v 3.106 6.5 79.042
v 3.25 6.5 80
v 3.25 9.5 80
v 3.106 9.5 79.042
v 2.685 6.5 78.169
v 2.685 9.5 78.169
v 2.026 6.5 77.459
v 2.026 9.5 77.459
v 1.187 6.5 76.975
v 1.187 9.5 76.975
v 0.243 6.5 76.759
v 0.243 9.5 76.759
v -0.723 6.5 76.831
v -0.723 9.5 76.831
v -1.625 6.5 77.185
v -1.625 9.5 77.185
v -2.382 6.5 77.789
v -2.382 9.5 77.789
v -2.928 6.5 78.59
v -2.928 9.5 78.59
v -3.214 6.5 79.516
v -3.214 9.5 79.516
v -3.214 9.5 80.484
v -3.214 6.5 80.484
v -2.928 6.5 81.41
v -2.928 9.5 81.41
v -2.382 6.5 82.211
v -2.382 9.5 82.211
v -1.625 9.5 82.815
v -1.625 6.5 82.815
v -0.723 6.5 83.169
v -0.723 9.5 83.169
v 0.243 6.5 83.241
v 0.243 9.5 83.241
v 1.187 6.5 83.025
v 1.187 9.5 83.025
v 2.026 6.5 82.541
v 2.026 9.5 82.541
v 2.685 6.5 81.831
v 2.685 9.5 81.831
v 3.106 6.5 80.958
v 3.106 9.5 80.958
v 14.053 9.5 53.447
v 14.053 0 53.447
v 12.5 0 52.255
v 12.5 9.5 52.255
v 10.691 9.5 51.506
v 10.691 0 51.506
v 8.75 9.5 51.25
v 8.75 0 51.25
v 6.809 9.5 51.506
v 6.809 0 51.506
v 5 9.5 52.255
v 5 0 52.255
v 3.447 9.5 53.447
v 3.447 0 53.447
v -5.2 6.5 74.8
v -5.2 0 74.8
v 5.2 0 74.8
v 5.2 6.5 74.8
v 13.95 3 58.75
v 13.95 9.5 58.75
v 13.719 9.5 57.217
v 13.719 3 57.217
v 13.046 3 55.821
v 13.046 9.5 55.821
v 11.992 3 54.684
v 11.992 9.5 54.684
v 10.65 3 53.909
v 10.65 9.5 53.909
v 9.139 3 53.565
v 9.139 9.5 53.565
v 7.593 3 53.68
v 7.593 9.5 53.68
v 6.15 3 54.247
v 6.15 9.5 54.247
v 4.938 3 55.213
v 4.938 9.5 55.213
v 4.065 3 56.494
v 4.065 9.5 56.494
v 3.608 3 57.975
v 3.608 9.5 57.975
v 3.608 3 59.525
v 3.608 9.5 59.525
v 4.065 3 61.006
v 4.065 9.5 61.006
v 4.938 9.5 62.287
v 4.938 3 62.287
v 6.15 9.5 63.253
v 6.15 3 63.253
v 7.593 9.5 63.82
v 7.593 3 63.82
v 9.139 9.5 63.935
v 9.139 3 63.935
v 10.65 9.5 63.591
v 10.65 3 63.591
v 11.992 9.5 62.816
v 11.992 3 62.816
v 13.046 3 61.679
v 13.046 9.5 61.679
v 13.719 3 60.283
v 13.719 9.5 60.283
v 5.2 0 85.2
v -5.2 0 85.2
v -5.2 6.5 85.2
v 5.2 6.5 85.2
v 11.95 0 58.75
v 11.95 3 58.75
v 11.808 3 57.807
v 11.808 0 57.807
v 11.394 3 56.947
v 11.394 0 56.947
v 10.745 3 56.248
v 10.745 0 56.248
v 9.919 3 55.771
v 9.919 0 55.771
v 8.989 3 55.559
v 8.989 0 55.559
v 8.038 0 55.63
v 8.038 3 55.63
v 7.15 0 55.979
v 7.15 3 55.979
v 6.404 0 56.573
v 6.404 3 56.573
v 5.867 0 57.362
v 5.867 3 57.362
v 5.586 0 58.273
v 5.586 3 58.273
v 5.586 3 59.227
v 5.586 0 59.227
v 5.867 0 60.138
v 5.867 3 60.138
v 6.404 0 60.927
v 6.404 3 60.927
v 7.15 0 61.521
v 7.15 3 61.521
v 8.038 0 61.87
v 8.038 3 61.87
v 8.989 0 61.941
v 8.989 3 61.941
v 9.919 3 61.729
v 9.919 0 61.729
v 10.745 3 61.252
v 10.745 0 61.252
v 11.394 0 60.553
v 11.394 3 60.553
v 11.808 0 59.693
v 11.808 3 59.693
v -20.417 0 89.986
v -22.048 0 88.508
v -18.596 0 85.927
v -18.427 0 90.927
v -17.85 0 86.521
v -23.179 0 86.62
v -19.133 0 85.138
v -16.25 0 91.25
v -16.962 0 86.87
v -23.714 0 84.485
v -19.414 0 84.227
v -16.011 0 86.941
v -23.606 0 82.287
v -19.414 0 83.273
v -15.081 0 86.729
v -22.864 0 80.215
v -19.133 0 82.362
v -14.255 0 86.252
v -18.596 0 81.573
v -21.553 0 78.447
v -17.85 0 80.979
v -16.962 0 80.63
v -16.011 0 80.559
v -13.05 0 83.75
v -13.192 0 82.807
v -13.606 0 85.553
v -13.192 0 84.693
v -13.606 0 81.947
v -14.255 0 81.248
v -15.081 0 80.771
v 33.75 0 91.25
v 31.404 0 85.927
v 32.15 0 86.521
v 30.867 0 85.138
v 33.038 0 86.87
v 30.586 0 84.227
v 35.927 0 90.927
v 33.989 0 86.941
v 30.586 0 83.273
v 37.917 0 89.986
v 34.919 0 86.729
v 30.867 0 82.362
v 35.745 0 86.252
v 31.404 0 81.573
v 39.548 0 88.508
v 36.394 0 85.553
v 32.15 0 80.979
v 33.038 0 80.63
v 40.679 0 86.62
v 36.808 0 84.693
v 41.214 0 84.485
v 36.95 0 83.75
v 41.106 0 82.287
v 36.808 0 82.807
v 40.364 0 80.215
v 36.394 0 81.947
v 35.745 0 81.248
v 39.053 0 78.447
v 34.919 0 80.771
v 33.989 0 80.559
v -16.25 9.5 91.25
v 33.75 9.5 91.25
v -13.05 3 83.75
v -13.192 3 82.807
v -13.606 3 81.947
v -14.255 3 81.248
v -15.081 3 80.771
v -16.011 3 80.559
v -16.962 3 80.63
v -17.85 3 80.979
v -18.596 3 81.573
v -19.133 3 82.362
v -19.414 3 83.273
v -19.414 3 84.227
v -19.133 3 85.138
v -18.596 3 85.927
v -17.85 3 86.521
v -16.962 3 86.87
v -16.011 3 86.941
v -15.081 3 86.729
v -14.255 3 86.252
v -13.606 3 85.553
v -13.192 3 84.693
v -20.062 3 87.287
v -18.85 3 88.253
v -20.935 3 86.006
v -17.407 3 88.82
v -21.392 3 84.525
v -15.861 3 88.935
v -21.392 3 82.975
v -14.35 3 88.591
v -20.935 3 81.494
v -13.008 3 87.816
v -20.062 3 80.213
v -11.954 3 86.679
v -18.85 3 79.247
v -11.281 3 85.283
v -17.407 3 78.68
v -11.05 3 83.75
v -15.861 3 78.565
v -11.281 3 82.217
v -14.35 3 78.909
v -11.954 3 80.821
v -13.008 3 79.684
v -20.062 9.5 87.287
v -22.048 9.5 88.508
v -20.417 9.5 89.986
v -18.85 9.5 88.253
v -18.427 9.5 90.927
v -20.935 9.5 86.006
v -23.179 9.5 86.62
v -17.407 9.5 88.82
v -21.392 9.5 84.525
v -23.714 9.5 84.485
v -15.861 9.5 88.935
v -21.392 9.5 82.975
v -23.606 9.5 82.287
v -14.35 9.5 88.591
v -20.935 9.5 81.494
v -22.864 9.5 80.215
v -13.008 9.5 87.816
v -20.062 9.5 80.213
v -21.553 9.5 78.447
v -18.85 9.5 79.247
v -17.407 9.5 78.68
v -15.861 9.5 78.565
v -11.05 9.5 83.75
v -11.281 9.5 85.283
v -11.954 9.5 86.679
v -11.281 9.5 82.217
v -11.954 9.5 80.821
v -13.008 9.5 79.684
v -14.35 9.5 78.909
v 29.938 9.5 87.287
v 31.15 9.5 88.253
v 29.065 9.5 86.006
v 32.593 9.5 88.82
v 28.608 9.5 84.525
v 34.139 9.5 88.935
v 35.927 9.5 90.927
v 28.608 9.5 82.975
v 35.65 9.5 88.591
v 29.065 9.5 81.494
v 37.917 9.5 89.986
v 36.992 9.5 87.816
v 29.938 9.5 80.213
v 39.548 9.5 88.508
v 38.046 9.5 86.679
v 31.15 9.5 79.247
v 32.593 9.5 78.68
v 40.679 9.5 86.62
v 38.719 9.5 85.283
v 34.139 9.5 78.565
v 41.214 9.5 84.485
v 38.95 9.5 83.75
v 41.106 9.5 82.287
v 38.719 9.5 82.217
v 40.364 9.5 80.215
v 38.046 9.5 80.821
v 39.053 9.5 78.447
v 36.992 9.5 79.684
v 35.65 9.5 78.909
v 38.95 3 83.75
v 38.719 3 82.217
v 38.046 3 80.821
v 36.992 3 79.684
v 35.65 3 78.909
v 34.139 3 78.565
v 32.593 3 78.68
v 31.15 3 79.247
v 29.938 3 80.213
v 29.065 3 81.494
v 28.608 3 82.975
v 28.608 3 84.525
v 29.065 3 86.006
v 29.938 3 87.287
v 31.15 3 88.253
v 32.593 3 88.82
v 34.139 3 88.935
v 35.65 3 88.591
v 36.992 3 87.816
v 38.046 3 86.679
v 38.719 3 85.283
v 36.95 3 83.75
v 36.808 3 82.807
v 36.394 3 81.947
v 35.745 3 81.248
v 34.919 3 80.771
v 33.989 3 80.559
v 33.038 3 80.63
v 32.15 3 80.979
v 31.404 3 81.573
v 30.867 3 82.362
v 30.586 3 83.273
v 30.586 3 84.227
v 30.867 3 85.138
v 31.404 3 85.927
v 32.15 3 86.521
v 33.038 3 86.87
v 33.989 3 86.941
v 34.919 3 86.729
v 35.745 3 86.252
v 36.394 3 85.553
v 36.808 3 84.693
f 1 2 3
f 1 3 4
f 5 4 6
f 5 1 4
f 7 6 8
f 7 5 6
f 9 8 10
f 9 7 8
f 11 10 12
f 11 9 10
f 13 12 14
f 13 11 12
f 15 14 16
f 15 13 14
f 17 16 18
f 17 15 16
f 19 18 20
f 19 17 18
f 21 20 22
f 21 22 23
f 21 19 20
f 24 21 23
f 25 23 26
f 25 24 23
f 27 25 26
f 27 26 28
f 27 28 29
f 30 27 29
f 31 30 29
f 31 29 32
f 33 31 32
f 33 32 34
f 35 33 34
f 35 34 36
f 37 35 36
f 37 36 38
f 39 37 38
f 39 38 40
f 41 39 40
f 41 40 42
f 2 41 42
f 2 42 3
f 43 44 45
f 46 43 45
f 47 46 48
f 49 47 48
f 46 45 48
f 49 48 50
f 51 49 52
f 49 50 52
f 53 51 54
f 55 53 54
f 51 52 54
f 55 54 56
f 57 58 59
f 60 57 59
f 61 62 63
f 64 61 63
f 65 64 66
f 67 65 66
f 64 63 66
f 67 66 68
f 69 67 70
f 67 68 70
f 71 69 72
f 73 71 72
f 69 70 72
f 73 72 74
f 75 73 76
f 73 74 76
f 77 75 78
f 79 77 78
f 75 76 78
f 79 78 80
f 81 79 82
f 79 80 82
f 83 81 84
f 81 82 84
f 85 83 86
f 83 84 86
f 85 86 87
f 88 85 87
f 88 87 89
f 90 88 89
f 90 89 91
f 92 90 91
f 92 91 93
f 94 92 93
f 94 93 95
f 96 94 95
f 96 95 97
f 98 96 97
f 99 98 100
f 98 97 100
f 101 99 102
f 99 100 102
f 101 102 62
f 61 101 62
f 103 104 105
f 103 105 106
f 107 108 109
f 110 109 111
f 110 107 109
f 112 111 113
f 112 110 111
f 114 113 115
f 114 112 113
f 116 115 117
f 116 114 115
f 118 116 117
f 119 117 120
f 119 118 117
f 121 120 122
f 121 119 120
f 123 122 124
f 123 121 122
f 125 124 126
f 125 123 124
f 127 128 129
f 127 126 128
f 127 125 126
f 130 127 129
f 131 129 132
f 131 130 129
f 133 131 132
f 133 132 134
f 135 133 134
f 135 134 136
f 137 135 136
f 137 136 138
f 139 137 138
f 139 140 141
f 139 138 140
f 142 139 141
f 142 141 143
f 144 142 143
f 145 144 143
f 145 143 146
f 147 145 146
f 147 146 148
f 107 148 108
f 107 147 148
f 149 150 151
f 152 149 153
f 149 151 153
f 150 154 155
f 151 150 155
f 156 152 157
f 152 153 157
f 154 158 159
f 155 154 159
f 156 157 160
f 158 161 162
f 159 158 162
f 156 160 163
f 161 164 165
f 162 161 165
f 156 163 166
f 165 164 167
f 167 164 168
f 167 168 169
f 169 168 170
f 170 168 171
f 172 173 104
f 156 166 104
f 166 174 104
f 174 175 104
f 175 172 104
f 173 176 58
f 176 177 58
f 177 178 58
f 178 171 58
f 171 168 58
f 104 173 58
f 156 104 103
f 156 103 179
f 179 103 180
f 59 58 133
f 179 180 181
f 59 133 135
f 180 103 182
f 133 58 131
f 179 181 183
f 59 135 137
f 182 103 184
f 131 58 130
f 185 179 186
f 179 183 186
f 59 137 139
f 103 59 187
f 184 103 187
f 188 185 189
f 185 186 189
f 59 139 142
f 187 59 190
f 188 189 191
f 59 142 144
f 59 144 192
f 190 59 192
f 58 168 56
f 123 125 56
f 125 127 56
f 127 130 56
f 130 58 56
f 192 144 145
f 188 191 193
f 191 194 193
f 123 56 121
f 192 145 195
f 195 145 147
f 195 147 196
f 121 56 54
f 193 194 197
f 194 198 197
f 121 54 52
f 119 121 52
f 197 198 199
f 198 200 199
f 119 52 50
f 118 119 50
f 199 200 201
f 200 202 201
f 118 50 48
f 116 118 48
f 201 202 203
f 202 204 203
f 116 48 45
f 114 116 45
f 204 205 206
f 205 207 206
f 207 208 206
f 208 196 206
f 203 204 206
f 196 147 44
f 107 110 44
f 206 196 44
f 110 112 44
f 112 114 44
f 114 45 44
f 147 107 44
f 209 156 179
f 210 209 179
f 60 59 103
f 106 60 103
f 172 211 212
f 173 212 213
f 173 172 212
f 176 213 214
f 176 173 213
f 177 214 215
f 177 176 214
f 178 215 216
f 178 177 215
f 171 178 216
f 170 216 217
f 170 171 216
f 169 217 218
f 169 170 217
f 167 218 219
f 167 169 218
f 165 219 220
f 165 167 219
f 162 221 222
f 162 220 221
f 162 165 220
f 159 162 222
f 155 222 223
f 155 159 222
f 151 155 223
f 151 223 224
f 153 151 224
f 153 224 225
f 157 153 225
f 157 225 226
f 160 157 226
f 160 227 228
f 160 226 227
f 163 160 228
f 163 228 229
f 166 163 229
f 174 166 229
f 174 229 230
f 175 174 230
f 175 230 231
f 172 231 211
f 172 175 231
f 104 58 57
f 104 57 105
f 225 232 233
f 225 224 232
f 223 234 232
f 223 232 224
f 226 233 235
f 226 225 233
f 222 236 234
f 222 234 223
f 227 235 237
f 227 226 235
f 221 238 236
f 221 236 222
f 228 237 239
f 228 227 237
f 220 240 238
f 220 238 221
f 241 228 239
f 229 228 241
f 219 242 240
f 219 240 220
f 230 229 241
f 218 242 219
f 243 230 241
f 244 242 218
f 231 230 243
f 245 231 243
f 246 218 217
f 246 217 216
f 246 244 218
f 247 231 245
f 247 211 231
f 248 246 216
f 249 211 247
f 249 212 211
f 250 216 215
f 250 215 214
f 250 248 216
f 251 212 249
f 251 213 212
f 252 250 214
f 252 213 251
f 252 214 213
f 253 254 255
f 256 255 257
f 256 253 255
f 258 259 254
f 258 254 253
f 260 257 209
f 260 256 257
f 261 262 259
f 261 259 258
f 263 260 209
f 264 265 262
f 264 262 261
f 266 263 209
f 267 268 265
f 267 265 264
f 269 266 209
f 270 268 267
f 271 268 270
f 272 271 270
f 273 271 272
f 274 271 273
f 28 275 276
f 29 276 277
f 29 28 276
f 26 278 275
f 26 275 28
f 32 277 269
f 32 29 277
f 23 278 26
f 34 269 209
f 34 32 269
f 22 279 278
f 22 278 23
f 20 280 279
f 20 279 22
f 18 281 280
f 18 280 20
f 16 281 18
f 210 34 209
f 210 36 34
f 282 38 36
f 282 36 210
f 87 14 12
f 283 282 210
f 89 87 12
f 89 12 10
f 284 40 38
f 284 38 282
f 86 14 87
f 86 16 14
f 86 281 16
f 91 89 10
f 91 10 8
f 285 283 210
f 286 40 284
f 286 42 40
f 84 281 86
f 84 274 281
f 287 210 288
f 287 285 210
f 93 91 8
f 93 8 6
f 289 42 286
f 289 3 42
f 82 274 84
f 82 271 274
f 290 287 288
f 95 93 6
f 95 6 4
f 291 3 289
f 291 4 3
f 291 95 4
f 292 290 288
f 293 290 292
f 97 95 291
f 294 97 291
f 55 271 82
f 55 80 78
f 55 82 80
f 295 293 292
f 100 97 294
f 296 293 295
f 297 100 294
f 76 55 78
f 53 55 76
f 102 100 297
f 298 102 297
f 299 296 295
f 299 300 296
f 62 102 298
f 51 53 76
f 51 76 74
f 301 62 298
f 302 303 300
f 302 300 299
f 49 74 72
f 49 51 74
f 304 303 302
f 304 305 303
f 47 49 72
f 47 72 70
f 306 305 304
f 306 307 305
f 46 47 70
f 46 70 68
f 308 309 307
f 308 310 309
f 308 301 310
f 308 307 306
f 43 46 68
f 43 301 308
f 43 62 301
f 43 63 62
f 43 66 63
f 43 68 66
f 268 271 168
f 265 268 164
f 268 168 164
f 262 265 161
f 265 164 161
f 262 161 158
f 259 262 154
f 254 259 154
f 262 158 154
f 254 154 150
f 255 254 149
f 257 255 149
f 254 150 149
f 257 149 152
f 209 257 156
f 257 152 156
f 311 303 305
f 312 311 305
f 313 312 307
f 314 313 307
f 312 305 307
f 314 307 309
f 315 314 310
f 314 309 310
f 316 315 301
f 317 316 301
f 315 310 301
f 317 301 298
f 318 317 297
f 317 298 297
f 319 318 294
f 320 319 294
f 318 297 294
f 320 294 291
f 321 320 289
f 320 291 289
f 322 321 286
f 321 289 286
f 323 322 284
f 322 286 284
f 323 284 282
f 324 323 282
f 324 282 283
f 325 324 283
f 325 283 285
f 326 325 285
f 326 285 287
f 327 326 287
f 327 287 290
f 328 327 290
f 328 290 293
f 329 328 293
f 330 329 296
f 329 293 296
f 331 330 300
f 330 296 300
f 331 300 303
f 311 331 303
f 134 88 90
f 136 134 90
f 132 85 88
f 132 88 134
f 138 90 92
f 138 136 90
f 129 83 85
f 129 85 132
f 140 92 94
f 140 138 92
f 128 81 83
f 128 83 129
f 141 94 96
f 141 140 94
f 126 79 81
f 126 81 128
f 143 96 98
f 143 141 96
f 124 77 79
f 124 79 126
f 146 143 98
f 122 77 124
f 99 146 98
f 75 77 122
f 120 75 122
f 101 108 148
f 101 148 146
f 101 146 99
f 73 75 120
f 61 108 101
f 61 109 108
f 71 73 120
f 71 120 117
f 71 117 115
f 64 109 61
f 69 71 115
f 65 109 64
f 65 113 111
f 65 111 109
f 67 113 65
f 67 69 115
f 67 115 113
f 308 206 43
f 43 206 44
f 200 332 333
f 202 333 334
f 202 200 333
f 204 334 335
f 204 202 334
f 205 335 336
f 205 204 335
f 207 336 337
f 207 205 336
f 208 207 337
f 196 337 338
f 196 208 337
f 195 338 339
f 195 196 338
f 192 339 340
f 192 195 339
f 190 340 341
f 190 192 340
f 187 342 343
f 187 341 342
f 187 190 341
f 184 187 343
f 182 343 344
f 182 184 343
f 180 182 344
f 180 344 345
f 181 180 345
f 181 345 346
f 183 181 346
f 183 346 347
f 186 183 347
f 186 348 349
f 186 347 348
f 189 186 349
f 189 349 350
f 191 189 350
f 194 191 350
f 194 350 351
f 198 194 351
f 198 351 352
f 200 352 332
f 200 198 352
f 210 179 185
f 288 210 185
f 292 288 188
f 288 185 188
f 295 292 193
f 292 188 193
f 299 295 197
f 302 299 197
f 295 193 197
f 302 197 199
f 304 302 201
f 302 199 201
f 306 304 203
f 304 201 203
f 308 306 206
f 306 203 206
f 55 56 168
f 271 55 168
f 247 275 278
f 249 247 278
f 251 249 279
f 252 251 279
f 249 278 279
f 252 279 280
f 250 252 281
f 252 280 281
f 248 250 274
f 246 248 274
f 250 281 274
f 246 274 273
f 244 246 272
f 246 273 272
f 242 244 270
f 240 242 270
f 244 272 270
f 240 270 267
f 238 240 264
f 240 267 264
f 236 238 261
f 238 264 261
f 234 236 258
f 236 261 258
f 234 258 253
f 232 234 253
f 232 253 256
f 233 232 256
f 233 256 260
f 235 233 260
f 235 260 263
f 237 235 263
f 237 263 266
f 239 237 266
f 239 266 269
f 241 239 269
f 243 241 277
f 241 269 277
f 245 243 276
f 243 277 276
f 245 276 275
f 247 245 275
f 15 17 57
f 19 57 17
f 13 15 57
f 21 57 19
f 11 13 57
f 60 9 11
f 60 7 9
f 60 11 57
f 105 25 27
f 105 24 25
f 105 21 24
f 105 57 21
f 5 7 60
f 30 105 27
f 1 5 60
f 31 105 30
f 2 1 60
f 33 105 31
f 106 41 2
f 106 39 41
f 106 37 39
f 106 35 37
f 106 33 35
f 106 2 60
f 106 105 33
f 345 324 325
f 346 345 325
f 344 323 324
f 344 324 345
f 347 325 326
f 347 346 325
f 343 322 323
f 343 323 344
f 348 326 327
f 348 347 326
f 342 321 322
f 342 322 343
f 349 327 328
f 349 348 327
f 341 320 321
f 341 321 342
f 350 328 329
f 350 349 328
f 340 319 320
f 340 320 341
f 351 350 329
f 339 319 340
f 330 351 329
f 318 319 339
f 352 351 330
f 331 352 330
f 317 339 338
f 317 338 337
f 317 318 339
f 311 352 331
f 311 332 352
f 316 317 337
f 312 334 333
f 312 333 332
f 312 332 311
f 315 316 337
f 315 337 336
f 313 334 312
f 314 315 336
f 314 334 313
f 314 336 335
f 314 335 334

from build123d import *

# Parameters (mm, degrees)
SKETCH_1_R          = 3.25
SKETCH_1_R_2        = 3.2
EXTRUDE_1_DEPTH     = 9.5
SKETCH_2_R          = 5.2
CUT_EXTRUDE_1_DEPTH = 6.5
SKETCH_3_W          = 10.4
SKETCH_3_H          = 10.4
SKETCH_3_R          = 3.25
CUT_EXTRUDE_2_DEPTH = 6.5


with BuildPart() as part:
    # 스케치1 → 보스-돌출1 (new body)
    with BuildSketch(Plane(origin=(0, 0, 0), x_dir=(1, 0, 0), z_dir=(0, 1, 0))):
        with BuildLine():
            Line((3.446699141, -53.446699141), (-21.553300859, -78.446699141))
            ThreePointArc((-21.553300859, -78.446699141), (-23.179096494, -86.620125743), (-16.25, -91.25))
            Line((-16.25, -91.25), (33.75, -91.25))
            ThreePointArc((33.75, -91.25), (40.679096494, -86.620125743), (39.053300859, -78.446699141))
            Line((39.053300859, -78.446699141), (14.053300859, -53.446699141))
            ThreePointArc((14.053300859, -53.446699141), (8.75, -51.25), (3.446699141, -53.446699141))
        make_face()
        with Locations((0, -80)):
            Circle(SKETCH_1_R, mode=Mode.SUBTRACT)
        with Locations((-16.25, -83.75)):
            Circle(SKETCH_1_R_2, mode=Mode.SUBTRACT)
        with Locations((8.75, -58.75)):
            Circle(SKETCH_1_R_2, mode=Mode.SUBTRACT)
        with Locations((33.75, -83.75)):
            Circle(SKETCH_1_R_2, mode=Mode.SUBTRACT)
    extrude(amount=EXTRUDE_1_DEPTH)

    # 스케치2 → 컷-돌출1 (cut)
    with BuildSketch(Plane(origin=(0, 9.5, 0), x_dir=(1, 0, 0), z_dir=(0, 1, 0))):
        with Locations((8.75, -58.75)):
            Circle(SKETCH_2_R)
        with Locations((33.75, -83.75)):
            Circle(SKETCH_2_R)
        with Locations((-16.25, -83.75)):
            Circle(SKETCH_2_R)
    extrude(amount=-CUT_EXTRUDE_1_DEPTH, mode=Mode.SUBTRACT)

    # 스케치3 → 컷-돌출2 (cut)
    with BuildSketch(Plane.XZ):
        with Locations((0, 80)):
            Rectangle(SKETCH_3_W, SKETCH_3_H)
        with Locations((0, 80)):
            Circle(SKETCH_3_R, mode=Mode.SUBTRACT)
    extrude(amount=-CUT_EXTRUDE_2_DEPTH, mode=Mode.SUBTRACT)


solid = part.part
